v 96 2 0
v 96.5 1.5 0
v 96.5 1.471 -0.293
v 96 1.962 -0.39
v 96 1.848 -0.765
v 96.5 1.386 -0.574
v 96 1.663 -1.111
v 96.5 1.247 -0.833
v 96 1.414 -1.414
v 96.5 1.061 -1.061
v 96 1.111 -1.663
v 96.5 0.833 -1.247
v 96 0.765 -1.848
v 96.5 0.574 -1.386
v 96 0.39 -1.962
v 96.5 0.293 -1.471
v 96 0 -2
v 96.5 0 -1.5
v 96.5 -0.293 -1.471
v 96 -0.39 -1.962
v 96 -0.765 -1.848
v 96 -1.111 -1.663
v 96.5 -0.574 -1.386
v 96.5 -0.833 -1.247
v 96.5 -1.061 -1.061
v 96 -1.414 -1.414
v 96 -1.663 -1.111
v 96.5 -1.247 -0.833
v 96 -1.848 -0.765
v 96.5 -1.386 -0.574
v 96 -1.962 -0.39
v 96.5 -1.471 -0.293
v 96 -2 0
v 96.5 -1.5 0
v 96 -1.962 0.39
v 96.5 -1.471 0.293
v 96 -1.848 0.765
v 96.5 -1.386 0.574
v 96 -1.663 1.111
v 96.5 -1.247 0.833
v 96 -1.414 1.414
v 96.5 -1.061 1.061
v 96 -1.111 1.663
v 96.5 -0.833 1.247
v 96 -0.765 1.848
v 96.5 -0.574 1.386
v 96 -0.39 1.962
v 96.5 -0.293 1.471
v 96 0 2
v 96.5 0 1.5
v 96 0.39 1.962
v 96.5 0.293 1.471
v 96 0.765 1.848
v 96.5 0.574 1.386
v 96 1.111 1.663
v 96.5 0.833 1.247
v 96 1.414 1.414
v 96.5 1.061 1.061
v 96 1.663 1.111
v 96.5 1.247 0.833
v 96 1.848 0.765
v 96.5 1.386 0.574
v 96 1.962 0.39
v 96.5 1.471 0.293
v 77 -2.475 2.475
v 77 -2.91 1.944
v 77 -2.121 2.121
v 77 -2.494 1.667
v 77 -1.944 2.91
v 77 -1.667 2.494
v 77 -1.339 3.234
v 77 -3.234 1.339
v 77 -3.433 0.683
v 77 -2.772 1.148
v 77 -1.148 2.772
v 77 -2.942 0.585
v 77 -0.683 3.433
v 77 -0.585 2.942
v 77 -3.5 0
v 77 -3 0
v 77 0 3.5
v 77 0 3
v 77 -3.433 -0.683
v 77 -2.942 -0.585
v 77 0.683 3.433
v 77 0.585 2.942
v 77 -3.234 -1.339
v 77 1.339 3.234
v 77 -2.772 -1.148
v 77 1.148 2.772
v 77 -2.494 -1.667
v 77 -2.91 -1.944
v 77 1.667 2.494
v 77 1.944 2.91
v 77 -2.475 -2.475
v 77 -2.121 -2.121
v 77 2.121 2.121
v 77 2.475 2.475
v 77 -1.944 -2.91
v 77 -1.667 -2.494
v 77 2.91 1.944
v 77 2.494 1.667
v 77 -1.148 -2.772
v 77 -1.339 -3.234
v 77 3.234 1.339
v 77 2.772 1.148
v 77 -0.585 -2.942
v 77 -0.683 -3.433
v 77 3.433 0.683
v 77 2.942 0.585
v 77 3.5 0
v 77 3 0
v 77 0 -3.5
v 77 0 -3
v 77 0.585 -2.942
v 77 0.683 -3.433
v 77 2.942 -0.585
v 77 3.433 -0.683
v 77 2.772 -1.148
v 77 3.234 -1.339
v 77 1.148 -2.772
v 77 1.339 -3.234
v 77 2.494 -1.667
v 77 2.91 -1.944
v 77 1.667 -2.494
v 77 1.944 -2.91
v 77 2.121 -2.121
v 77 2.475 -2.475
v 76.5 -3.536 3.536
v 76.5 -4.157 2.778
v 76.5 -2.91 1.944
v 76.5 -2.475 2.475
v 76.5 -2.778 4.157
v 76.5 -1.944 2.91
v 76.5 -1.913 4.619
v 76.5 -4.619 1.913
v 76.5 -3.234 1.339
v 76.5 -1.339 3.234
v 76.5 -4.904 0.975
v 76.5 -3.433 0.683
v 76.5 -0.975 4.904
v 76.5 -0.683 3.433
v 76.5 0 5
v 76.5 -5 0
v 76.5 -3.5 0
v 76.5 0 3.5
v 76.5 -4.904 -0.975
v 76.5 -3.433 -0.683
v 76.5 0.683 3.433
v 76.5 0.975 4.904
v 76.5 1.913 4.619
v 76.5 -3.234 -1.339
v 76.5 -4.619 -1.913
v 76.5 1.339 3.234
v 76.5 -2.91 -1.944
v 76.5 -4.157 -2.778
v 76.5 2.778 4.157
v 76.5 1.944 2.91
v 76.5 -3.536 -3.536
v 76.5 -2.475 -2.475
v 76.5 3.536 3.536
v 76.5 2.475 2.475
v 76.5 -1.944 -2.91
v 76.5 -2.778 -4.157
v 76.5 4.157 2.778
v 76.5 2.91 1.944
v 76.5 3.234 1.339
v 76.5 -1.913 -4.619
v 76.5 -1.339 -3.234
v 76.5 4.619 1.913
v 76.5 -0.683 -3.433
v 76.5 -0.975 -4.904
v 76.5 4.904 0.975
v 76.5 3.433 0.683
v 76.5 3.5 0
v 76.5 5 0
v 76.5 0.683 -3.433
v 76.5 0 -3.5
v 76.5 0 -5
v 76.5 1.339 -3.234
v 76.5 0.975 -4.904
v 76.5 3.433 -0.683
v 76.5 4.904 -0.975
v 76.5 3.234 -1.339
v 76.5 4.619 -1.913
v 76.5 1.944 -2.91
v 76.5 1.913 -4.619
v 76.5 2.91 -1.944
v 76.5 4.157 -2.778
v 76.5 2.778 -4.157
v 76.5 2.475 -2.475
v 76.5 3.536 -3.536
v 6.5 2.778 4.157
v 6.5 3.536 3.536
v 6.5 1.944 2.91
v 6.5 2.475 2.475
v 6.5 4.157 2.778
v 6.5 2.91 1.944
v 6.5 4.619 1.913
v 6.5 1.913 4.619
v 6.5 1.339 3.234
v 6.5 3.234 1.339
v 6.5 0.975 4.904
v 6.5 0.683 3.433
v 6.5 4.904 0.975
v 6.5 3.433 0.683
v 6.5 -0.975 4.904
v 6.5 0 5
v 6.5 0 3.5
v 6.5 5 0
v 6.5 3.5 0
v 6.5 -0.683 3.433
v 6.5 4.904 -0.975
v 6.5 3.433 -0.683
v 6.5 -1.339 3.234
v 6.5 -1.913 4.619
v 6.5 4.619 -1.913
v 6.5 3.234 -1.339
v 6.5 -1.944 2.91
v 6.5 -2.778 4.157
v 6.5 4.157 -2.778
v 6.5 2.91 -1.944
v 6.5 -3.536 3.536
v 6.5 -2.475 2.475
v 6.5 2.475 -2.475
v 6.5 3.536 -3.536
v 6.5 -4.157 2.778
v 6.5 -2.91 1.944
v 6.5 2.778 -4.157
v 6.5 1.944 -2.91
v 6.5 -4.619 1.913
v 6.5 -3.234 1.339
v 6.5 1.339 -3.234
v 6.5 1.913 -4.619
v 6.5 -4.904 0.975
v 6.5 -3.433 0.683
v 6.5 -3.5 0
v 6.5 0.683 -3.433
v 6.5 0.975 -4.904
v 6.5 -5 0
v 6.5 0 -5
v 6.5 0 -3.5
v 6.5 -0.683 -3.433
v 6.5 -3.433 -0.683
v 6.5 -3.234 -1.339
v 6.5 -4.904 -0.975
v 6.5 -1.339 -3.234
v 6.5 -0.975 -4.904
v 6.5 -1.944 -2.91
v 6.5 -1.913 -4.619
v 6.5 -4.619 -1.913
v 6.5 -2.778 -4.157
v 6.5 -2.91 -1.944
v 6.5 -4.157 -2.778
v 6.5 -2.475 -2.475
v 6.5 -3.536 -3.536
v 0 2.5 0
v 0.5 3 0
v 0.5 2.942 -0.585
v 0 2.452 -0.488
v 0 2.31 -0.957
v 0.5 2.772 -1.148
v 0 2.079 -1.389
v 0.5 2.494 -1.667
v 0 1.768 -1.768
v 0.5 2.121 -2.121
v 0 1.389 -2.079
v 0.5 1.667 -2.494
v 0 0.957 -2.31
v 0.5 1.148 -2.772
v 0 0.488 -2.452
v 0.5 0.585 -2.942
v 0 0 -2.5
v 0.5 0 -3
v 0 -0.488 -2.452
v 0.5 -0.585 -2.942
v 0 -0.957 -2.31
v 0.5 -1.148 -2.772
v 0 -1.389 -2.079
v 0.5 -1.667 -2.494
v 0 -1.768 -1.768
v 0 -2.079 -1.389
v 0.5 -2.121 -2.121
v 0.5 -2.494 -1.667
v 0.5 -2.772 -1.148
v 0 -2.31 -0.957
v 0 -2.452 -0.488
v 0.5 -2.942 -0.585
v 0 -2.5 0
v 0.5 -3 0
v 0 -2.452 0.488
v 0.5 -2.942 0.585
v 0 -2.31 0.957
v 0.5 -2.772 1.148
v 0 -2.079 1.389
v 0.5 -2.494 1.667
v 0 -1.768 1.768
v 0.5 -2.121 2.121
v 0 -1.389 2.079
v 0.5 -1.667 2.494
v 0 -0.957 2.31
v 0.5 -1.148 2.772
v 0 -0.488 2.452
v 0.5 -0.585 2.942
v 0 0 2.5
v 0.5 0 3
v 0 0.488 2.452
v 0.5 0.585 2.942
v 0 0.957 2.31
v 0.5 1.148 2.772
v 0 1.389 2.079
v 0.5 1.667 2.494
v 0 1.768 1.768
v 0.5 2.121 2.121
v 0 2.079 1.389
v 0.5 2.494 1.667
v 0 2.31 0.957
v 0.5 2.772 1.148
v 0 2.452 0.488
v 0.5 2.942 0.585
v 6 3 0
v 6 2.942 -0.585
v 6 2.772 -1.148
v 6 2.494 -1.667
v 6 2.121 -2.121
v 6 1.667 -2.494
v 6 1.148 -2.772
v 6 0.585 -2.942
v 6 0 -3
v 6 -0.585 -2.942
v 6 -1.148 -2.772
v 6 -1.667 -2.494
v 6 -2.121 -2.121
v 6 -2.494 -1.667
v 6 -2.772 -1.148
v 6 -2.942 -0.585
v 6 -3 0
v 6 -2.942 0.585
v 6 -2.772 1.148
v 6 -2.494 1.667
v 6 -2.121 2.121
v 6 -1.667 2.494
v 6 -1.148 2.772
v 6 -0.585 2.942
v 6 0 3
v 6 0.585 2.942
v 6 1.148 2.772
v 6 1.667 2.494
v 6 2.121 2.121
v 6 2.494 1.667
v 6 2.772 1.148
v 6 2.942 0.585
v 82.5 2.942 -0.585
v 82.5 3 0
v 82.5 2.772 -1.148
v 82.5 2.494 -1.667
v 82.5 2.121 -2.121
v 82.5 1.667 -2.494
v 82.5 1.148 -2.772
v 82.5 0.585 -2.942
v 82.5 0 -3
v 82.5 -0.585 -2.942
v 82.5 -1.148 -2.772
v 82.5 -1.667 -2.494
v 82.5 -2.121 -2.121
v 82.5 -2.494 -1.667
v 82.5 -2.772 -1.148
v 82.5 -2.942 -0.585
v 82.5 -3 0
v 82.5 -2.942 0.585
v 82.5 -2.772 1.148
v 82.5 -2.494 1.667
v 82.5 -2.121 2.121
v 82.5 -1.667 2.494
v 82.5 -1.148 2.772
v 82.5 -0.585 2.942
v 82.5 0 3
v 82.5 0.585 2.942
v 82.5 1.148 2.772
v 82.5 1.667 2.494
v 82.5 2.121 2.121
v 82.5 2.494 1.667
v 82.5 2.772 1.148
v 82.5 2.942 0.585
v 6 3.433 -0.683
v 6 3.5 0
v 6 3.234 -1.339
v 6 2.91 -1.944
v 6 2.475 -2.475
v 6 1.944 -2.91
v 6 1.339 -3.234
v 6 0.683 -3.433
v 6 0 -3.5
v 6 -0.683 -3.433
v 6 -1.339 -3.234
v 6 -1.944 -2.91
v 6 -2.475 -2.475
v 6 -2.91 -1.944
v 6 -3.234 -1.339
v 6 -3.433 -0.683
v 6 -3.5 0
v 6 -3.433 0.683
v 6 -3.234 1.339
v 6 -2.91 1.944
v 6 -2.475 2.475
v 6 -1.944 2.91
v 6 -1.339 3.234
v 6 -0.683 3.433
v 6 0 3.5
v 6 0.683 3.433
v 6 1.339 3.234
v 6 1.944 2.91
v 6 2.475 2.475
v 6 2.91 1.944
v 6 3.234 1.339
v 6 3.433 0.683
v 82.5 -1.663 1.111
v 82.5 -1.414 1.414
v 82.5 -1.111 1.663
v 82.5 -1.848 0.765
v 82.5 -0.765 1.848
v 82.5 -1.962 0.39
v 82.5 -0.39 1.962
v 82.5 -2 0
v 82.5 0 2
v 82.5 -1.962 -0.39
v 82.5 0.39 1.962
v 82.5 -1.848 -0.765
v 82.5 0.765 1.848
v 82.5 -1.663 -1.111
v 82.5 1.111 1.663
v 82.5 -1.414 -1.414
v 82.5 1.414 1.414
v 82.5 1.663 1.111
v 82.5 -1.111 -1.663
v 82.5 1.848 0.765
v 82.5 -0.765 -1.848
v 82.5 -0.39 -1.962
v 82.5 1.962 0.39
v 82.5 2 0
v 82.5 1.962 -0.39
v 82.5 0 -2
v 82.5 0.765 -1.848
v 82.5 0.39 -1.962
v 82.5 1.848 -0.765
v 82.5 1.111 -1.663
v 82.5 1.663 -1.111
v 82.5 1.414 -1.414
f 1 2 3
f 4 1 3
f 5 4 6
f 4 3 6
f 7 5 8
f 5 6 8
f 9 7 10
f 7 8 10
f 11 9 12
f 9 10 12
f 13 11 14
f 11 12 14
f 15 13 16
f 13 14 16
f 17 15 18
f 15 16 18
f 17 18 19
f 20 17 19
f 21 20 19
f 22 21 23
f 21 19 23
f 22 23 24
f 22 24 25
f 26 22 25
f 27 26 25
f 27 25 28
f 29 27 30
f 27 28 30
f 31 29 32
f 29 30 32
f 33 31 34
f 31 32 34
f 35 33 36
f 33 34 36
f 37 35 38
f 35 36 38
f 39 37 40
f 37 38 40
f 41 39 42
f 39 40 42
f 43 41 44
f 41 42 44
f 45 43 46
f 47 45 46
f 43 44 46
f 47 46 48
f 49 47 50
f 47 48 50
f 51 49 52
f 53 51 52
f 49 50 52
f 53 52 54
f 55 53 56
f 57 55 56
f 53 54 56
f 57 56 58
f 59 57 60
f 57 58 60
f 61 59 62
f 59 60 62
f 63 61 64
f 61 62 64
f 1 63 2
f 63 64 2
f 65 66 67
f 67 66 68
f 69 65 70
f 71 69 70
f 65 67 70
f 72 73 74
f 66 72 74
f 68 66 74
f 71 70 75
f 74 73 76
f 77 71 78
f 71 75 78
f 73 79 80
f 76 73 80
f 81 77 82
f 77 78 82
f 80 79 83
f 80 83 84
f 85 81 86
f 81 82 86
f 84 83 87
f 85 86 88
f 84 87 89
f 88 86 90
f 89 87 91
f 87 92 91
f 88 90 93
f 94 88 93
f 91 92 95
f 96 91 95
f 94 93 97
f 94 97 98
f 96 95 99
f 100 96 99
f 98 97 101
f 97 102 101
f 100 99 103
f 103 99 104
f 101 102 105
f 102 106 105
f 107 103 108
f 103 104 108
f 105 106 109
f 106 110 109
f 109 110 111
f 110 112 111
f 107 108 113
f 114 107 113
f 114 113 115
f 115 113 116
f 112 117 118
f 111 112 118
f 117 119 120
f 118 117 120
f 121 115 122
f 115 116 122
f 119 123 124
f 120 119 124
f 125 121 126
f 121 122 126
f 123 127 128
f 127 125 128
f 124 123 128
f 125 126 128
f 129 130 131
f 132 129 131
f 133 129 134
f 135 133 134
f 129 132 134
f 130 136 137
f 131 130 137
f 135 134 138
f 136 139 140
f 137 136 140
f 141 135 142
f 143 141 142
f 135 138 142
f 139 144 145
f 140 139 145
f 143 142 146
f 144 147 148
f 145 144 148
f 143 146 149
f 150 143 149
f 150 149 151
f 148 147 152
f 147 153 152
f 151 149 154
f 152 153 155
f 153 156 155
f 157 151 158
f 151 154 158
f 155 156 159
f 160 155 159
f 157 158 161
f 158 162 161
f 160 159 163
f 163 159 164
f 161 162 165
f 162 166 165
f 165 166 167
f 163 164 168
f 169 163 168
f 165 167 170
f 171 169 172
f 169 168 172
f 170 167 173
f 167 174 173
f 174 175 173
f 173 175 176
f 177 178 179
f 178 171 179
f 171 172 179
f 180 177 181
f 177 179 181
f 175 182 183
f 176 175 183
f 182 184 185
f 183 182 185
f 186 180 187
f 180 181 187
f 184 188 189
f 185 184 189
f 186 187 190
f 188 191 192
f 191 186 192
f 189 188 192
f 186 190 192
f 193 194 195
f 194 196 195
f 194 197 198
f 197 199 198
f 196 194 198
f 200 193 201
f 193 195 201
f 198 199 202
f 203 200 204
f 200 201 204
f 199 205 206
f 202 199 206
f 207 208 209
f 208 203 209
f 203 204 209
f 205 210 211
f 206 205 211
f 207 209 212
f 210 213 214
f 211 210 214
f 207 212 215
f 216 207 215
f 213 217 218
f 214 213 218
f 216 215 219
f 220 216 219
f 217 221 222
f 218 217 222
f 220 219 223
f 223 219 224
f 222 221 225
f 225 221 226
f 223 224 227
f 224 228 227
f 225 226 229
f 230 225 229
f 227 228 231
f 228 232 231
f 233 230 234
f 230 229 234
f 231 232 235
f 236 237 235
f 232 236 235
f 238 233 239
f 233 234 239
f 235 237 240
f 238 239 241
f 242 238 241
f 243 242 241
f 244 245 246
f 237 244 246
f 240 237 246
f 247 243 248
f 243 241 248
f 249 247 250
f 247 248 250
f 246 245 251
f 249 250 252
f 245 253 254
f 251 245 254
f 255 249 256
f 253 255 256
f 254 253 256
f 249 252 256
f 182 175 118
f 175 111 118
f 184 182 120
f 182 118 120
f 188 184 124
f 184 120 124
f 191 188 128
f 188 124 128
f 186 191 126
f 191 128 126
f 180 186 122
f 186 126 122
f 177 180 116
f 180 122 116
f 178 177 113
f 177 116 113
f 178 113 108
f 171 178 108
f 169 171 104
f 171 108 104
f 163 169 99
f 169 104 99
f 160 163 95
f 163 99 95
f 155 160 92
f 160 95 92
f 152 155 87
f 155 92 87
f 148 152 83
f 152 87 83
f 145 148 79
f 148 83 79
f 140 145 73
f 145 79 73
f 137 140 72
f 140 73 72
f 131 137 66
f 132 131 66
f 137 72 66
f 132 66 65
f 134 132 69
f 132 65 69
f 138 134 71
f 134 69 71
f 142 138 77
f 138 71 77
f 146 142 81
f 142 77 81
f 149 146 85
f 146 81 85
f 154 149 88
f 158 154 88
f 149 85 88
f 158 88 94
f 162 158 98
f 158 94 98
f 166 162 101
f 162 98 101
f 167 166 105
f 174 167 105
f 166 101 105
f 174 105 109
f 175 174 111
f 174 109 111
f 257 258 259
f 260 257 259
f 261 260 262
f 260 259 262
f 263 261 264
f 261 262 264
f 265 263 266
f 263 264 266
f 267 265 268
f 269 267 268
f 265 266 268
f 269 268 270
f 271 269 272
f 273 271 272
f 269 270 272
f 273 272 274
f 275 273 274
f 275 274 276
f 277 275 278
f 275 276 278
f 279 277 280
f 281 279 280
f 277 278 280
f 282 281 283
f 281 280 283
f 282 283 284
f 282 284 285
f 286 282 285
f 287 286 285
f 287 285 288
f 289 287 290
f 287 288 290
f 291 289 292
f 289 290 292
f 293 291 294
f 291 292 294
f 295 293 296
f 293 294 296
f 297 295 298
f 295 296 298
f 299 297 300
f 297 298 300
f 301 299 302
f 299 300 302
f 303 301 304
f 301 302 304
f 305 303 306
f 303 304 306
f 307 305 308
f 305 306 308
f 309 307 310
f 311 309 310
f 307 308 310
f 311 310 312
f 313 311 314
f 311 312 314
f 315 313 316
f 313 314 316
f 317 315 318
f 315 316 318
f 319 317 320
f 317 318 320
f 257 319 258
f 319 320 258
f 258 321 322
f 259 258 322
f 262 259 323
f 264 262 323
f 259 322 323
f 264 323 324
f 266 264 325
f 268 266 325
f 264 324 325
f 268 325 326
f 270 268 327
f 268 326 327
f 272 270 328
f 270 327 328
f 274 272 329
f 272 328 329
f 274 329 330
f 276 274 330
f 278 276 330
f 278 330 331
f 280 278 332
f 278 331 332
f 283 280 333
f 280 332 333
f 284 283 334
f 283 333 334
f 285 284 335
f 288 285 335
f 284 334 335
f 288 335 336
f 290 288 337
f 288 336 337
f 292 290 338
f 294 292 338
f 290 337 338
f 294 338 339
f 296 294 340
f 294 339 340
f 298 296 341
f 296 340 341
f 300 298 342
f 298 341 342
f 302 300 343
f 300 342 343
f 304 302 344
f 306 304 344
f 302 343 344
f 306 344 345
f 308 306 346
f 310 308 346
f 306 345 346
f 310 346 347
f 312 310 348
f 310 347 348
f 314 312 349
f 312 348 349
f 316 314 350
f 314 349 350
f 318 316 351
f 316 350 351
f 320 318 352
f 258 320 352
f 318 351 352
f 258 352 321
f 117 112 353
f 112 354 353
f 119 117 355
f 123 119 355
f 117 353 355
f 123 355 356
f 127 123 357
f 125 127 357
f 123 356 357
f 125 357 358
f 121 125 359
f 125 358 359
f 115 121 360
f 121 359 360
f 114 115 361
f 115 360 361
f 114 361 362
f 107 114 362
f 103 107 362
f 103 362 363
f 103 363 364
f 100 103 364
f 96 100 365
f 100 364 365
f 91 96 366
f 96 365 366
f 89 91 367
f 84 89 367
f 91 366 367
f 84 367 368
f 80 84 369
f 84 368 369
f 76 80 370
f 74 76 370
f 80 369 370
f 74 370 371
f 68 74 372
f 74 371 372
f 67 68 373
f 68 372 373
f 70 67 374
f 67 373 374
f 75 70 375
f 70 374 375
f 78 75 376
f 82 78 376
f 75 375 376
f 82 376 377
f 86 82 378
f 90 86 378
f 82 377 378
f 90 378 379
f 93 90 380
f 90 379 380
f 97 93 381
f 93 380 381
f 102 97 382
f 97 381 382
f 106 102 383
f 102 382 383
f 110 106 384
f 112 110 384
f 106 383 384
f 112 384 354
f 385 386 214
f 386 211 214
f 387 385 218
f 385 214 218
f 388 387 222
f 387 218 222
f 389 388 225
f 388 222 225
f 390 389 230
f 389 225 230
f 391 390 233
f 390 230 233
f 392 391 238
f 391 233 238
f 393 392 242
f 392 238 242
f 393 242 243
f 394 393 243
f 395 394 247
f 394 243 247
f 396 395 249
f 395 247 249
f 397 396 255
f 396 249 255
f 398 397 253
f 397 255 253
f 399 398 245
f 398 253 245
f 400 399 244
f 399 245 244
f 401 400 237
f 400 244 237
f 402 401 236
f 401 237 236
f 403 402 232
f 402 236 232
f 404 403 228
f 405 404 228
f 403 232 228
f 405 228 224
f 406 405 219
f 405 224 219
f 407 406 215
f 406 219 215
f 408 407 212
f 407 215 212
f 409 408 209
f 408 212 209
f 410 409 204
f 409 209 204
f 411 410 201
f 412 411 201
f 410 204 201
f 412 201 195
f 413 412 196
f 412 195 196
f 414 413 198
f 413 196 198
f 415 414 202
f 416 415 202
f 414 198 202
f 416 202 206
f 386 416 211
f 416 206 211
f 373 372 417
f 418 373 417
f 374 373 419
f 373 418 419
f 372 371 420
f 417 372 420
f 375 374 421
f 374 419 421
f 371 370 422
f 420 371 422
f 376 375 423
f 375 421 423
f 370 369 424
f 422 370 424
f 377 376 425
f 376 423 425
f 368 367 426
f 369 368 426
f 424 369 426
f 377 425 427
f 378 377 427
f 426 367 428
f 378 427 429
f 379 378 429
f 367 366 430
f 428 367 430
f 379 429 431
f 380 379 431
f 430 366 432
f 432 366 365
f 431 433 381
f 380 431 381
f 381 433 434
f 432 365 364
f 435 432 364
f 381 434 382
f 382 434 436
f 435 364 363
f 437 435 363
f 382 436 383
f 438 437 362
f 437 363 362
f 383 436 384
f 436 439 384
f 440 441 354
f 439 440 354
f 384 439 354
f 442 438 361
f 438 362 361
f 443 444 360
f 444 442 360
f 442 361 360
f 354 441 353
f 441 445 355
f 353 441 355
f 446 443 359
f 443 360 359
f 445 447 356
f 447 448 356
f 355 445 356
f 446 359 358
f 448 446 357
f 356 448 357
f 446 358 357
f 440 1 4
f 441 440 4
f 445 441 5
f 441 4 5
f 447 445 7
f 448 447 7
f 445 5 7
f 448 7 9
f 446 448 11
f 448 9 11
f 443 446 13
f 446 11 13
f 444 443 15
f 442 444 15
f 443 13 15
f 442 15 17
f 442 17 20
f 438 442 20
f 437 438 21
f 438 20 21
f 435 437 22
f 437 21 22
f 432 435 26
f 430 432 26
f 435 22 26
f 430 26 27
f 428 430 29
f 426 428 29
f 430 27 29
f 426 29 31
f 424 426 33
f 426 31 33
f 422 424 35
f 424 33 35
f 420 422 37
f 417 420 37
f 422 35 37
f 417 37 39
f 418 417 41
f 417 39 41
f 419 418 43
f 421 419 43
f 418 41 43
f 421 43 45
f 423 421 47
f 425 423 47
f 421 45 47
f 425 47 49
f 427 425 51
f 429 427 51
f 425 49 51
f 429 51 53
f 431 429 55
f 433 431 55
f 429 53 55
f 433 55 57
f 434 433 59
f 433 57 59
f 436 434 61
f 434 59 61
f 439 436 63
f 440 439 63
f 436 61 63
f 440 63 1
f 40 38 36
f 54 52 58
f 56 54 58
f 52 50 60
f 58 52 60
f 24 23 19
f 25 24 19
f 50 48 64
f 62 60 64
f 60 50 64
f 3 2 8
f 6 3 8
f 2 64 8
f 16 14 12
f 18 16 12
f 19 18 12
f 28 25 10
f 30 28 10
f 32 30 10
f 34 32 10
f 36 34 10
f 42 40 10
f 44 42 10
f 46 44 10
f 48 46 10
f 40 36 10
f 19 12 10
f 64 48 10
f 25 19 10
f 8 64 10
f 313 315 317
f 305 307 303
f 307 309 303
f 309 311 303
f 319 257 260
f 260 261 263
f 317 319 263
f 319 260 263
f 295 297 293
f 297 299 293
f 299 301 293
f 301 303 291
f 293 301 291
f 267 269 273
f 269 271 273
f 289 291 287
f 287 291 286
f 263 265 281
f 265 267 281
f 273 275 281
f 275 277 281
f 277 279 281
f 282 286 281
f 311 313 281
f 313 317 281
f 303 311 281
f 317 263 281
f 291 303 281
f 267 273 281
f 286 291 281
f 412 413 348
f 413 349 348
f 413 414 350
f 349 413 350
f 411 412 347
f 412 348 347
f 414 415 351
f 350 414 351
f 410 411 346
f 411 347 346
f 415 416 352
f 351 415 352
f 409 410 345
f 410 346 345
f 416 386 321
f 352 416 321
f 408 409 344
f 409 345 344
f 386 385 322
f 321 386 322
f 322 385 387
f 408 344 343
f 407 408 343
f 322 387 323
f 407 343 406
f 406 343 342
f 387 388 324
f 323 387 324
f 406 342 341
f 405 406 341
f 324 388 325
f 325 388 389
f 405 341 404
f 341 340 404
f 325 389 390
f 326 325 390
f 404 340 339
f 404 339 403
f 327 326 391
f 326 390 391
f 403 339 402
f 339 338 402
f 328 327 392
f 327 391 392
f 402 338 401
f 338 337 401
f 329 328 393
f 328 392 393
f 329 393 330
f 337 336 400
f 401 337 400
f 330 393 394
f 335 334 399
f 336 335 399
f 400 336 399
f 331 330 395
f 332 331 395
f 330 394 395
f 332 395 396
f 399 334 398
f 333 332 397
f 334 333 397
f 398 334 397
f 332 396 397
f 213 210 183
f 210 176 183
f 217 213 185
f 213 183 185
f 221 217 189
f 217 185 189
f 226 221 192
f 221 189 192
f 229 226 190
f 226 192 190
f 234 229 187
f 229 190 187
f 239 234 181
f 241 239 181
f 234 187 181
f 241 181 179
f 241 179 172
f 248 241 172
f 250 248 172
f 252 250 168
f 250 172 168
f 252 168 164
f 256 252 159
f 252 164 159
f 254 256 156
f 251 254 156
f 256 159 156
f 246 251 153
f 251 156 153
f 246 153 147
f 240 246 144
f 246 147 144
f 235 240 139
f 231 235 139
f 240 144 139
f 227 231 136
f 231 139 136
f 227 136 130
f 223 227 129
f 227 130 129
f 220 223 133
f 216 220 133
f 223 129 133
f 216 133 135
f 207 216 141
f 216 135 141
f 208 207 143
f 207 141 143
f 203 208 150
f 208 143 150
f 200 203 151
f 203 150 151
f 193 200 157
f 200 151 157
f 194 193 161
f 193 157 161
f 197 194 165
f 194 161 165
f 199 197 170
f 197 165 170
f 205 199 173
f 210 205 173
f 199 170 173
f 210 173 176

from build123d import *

# Parameters (mm, degrees)
CHAMFER1_SIZE = 0.5


with BuildPart() as part:
    # Sketch1 → Revolve1 (revolve)
    with BuildSketch(Plane.XY):
        Polygon((0, 0), (0, 3), (6, 3), (6, 3.5), (6.5, 3.5), (6.5, 5), (76.5, 5), (76.5, 3.5), (77, 3.5), (77, 3), (82.5, 3), (82.5, 2), (96.5, 2), (96.5, 0), align=None)
    revolve(axis=Axis((96.5, 0, 0), (-1, 0, 0)))

    # Chamfer1
    chamfer1_edges = [part.edges().sort_by_distance(p)[0] for p in [
        (0, -3, 0),
        (96.5, -2, 0),
    ]]
    chamfer(chamfer1_edges, length=CHAMFER1_SIZE)


solid = part.part
